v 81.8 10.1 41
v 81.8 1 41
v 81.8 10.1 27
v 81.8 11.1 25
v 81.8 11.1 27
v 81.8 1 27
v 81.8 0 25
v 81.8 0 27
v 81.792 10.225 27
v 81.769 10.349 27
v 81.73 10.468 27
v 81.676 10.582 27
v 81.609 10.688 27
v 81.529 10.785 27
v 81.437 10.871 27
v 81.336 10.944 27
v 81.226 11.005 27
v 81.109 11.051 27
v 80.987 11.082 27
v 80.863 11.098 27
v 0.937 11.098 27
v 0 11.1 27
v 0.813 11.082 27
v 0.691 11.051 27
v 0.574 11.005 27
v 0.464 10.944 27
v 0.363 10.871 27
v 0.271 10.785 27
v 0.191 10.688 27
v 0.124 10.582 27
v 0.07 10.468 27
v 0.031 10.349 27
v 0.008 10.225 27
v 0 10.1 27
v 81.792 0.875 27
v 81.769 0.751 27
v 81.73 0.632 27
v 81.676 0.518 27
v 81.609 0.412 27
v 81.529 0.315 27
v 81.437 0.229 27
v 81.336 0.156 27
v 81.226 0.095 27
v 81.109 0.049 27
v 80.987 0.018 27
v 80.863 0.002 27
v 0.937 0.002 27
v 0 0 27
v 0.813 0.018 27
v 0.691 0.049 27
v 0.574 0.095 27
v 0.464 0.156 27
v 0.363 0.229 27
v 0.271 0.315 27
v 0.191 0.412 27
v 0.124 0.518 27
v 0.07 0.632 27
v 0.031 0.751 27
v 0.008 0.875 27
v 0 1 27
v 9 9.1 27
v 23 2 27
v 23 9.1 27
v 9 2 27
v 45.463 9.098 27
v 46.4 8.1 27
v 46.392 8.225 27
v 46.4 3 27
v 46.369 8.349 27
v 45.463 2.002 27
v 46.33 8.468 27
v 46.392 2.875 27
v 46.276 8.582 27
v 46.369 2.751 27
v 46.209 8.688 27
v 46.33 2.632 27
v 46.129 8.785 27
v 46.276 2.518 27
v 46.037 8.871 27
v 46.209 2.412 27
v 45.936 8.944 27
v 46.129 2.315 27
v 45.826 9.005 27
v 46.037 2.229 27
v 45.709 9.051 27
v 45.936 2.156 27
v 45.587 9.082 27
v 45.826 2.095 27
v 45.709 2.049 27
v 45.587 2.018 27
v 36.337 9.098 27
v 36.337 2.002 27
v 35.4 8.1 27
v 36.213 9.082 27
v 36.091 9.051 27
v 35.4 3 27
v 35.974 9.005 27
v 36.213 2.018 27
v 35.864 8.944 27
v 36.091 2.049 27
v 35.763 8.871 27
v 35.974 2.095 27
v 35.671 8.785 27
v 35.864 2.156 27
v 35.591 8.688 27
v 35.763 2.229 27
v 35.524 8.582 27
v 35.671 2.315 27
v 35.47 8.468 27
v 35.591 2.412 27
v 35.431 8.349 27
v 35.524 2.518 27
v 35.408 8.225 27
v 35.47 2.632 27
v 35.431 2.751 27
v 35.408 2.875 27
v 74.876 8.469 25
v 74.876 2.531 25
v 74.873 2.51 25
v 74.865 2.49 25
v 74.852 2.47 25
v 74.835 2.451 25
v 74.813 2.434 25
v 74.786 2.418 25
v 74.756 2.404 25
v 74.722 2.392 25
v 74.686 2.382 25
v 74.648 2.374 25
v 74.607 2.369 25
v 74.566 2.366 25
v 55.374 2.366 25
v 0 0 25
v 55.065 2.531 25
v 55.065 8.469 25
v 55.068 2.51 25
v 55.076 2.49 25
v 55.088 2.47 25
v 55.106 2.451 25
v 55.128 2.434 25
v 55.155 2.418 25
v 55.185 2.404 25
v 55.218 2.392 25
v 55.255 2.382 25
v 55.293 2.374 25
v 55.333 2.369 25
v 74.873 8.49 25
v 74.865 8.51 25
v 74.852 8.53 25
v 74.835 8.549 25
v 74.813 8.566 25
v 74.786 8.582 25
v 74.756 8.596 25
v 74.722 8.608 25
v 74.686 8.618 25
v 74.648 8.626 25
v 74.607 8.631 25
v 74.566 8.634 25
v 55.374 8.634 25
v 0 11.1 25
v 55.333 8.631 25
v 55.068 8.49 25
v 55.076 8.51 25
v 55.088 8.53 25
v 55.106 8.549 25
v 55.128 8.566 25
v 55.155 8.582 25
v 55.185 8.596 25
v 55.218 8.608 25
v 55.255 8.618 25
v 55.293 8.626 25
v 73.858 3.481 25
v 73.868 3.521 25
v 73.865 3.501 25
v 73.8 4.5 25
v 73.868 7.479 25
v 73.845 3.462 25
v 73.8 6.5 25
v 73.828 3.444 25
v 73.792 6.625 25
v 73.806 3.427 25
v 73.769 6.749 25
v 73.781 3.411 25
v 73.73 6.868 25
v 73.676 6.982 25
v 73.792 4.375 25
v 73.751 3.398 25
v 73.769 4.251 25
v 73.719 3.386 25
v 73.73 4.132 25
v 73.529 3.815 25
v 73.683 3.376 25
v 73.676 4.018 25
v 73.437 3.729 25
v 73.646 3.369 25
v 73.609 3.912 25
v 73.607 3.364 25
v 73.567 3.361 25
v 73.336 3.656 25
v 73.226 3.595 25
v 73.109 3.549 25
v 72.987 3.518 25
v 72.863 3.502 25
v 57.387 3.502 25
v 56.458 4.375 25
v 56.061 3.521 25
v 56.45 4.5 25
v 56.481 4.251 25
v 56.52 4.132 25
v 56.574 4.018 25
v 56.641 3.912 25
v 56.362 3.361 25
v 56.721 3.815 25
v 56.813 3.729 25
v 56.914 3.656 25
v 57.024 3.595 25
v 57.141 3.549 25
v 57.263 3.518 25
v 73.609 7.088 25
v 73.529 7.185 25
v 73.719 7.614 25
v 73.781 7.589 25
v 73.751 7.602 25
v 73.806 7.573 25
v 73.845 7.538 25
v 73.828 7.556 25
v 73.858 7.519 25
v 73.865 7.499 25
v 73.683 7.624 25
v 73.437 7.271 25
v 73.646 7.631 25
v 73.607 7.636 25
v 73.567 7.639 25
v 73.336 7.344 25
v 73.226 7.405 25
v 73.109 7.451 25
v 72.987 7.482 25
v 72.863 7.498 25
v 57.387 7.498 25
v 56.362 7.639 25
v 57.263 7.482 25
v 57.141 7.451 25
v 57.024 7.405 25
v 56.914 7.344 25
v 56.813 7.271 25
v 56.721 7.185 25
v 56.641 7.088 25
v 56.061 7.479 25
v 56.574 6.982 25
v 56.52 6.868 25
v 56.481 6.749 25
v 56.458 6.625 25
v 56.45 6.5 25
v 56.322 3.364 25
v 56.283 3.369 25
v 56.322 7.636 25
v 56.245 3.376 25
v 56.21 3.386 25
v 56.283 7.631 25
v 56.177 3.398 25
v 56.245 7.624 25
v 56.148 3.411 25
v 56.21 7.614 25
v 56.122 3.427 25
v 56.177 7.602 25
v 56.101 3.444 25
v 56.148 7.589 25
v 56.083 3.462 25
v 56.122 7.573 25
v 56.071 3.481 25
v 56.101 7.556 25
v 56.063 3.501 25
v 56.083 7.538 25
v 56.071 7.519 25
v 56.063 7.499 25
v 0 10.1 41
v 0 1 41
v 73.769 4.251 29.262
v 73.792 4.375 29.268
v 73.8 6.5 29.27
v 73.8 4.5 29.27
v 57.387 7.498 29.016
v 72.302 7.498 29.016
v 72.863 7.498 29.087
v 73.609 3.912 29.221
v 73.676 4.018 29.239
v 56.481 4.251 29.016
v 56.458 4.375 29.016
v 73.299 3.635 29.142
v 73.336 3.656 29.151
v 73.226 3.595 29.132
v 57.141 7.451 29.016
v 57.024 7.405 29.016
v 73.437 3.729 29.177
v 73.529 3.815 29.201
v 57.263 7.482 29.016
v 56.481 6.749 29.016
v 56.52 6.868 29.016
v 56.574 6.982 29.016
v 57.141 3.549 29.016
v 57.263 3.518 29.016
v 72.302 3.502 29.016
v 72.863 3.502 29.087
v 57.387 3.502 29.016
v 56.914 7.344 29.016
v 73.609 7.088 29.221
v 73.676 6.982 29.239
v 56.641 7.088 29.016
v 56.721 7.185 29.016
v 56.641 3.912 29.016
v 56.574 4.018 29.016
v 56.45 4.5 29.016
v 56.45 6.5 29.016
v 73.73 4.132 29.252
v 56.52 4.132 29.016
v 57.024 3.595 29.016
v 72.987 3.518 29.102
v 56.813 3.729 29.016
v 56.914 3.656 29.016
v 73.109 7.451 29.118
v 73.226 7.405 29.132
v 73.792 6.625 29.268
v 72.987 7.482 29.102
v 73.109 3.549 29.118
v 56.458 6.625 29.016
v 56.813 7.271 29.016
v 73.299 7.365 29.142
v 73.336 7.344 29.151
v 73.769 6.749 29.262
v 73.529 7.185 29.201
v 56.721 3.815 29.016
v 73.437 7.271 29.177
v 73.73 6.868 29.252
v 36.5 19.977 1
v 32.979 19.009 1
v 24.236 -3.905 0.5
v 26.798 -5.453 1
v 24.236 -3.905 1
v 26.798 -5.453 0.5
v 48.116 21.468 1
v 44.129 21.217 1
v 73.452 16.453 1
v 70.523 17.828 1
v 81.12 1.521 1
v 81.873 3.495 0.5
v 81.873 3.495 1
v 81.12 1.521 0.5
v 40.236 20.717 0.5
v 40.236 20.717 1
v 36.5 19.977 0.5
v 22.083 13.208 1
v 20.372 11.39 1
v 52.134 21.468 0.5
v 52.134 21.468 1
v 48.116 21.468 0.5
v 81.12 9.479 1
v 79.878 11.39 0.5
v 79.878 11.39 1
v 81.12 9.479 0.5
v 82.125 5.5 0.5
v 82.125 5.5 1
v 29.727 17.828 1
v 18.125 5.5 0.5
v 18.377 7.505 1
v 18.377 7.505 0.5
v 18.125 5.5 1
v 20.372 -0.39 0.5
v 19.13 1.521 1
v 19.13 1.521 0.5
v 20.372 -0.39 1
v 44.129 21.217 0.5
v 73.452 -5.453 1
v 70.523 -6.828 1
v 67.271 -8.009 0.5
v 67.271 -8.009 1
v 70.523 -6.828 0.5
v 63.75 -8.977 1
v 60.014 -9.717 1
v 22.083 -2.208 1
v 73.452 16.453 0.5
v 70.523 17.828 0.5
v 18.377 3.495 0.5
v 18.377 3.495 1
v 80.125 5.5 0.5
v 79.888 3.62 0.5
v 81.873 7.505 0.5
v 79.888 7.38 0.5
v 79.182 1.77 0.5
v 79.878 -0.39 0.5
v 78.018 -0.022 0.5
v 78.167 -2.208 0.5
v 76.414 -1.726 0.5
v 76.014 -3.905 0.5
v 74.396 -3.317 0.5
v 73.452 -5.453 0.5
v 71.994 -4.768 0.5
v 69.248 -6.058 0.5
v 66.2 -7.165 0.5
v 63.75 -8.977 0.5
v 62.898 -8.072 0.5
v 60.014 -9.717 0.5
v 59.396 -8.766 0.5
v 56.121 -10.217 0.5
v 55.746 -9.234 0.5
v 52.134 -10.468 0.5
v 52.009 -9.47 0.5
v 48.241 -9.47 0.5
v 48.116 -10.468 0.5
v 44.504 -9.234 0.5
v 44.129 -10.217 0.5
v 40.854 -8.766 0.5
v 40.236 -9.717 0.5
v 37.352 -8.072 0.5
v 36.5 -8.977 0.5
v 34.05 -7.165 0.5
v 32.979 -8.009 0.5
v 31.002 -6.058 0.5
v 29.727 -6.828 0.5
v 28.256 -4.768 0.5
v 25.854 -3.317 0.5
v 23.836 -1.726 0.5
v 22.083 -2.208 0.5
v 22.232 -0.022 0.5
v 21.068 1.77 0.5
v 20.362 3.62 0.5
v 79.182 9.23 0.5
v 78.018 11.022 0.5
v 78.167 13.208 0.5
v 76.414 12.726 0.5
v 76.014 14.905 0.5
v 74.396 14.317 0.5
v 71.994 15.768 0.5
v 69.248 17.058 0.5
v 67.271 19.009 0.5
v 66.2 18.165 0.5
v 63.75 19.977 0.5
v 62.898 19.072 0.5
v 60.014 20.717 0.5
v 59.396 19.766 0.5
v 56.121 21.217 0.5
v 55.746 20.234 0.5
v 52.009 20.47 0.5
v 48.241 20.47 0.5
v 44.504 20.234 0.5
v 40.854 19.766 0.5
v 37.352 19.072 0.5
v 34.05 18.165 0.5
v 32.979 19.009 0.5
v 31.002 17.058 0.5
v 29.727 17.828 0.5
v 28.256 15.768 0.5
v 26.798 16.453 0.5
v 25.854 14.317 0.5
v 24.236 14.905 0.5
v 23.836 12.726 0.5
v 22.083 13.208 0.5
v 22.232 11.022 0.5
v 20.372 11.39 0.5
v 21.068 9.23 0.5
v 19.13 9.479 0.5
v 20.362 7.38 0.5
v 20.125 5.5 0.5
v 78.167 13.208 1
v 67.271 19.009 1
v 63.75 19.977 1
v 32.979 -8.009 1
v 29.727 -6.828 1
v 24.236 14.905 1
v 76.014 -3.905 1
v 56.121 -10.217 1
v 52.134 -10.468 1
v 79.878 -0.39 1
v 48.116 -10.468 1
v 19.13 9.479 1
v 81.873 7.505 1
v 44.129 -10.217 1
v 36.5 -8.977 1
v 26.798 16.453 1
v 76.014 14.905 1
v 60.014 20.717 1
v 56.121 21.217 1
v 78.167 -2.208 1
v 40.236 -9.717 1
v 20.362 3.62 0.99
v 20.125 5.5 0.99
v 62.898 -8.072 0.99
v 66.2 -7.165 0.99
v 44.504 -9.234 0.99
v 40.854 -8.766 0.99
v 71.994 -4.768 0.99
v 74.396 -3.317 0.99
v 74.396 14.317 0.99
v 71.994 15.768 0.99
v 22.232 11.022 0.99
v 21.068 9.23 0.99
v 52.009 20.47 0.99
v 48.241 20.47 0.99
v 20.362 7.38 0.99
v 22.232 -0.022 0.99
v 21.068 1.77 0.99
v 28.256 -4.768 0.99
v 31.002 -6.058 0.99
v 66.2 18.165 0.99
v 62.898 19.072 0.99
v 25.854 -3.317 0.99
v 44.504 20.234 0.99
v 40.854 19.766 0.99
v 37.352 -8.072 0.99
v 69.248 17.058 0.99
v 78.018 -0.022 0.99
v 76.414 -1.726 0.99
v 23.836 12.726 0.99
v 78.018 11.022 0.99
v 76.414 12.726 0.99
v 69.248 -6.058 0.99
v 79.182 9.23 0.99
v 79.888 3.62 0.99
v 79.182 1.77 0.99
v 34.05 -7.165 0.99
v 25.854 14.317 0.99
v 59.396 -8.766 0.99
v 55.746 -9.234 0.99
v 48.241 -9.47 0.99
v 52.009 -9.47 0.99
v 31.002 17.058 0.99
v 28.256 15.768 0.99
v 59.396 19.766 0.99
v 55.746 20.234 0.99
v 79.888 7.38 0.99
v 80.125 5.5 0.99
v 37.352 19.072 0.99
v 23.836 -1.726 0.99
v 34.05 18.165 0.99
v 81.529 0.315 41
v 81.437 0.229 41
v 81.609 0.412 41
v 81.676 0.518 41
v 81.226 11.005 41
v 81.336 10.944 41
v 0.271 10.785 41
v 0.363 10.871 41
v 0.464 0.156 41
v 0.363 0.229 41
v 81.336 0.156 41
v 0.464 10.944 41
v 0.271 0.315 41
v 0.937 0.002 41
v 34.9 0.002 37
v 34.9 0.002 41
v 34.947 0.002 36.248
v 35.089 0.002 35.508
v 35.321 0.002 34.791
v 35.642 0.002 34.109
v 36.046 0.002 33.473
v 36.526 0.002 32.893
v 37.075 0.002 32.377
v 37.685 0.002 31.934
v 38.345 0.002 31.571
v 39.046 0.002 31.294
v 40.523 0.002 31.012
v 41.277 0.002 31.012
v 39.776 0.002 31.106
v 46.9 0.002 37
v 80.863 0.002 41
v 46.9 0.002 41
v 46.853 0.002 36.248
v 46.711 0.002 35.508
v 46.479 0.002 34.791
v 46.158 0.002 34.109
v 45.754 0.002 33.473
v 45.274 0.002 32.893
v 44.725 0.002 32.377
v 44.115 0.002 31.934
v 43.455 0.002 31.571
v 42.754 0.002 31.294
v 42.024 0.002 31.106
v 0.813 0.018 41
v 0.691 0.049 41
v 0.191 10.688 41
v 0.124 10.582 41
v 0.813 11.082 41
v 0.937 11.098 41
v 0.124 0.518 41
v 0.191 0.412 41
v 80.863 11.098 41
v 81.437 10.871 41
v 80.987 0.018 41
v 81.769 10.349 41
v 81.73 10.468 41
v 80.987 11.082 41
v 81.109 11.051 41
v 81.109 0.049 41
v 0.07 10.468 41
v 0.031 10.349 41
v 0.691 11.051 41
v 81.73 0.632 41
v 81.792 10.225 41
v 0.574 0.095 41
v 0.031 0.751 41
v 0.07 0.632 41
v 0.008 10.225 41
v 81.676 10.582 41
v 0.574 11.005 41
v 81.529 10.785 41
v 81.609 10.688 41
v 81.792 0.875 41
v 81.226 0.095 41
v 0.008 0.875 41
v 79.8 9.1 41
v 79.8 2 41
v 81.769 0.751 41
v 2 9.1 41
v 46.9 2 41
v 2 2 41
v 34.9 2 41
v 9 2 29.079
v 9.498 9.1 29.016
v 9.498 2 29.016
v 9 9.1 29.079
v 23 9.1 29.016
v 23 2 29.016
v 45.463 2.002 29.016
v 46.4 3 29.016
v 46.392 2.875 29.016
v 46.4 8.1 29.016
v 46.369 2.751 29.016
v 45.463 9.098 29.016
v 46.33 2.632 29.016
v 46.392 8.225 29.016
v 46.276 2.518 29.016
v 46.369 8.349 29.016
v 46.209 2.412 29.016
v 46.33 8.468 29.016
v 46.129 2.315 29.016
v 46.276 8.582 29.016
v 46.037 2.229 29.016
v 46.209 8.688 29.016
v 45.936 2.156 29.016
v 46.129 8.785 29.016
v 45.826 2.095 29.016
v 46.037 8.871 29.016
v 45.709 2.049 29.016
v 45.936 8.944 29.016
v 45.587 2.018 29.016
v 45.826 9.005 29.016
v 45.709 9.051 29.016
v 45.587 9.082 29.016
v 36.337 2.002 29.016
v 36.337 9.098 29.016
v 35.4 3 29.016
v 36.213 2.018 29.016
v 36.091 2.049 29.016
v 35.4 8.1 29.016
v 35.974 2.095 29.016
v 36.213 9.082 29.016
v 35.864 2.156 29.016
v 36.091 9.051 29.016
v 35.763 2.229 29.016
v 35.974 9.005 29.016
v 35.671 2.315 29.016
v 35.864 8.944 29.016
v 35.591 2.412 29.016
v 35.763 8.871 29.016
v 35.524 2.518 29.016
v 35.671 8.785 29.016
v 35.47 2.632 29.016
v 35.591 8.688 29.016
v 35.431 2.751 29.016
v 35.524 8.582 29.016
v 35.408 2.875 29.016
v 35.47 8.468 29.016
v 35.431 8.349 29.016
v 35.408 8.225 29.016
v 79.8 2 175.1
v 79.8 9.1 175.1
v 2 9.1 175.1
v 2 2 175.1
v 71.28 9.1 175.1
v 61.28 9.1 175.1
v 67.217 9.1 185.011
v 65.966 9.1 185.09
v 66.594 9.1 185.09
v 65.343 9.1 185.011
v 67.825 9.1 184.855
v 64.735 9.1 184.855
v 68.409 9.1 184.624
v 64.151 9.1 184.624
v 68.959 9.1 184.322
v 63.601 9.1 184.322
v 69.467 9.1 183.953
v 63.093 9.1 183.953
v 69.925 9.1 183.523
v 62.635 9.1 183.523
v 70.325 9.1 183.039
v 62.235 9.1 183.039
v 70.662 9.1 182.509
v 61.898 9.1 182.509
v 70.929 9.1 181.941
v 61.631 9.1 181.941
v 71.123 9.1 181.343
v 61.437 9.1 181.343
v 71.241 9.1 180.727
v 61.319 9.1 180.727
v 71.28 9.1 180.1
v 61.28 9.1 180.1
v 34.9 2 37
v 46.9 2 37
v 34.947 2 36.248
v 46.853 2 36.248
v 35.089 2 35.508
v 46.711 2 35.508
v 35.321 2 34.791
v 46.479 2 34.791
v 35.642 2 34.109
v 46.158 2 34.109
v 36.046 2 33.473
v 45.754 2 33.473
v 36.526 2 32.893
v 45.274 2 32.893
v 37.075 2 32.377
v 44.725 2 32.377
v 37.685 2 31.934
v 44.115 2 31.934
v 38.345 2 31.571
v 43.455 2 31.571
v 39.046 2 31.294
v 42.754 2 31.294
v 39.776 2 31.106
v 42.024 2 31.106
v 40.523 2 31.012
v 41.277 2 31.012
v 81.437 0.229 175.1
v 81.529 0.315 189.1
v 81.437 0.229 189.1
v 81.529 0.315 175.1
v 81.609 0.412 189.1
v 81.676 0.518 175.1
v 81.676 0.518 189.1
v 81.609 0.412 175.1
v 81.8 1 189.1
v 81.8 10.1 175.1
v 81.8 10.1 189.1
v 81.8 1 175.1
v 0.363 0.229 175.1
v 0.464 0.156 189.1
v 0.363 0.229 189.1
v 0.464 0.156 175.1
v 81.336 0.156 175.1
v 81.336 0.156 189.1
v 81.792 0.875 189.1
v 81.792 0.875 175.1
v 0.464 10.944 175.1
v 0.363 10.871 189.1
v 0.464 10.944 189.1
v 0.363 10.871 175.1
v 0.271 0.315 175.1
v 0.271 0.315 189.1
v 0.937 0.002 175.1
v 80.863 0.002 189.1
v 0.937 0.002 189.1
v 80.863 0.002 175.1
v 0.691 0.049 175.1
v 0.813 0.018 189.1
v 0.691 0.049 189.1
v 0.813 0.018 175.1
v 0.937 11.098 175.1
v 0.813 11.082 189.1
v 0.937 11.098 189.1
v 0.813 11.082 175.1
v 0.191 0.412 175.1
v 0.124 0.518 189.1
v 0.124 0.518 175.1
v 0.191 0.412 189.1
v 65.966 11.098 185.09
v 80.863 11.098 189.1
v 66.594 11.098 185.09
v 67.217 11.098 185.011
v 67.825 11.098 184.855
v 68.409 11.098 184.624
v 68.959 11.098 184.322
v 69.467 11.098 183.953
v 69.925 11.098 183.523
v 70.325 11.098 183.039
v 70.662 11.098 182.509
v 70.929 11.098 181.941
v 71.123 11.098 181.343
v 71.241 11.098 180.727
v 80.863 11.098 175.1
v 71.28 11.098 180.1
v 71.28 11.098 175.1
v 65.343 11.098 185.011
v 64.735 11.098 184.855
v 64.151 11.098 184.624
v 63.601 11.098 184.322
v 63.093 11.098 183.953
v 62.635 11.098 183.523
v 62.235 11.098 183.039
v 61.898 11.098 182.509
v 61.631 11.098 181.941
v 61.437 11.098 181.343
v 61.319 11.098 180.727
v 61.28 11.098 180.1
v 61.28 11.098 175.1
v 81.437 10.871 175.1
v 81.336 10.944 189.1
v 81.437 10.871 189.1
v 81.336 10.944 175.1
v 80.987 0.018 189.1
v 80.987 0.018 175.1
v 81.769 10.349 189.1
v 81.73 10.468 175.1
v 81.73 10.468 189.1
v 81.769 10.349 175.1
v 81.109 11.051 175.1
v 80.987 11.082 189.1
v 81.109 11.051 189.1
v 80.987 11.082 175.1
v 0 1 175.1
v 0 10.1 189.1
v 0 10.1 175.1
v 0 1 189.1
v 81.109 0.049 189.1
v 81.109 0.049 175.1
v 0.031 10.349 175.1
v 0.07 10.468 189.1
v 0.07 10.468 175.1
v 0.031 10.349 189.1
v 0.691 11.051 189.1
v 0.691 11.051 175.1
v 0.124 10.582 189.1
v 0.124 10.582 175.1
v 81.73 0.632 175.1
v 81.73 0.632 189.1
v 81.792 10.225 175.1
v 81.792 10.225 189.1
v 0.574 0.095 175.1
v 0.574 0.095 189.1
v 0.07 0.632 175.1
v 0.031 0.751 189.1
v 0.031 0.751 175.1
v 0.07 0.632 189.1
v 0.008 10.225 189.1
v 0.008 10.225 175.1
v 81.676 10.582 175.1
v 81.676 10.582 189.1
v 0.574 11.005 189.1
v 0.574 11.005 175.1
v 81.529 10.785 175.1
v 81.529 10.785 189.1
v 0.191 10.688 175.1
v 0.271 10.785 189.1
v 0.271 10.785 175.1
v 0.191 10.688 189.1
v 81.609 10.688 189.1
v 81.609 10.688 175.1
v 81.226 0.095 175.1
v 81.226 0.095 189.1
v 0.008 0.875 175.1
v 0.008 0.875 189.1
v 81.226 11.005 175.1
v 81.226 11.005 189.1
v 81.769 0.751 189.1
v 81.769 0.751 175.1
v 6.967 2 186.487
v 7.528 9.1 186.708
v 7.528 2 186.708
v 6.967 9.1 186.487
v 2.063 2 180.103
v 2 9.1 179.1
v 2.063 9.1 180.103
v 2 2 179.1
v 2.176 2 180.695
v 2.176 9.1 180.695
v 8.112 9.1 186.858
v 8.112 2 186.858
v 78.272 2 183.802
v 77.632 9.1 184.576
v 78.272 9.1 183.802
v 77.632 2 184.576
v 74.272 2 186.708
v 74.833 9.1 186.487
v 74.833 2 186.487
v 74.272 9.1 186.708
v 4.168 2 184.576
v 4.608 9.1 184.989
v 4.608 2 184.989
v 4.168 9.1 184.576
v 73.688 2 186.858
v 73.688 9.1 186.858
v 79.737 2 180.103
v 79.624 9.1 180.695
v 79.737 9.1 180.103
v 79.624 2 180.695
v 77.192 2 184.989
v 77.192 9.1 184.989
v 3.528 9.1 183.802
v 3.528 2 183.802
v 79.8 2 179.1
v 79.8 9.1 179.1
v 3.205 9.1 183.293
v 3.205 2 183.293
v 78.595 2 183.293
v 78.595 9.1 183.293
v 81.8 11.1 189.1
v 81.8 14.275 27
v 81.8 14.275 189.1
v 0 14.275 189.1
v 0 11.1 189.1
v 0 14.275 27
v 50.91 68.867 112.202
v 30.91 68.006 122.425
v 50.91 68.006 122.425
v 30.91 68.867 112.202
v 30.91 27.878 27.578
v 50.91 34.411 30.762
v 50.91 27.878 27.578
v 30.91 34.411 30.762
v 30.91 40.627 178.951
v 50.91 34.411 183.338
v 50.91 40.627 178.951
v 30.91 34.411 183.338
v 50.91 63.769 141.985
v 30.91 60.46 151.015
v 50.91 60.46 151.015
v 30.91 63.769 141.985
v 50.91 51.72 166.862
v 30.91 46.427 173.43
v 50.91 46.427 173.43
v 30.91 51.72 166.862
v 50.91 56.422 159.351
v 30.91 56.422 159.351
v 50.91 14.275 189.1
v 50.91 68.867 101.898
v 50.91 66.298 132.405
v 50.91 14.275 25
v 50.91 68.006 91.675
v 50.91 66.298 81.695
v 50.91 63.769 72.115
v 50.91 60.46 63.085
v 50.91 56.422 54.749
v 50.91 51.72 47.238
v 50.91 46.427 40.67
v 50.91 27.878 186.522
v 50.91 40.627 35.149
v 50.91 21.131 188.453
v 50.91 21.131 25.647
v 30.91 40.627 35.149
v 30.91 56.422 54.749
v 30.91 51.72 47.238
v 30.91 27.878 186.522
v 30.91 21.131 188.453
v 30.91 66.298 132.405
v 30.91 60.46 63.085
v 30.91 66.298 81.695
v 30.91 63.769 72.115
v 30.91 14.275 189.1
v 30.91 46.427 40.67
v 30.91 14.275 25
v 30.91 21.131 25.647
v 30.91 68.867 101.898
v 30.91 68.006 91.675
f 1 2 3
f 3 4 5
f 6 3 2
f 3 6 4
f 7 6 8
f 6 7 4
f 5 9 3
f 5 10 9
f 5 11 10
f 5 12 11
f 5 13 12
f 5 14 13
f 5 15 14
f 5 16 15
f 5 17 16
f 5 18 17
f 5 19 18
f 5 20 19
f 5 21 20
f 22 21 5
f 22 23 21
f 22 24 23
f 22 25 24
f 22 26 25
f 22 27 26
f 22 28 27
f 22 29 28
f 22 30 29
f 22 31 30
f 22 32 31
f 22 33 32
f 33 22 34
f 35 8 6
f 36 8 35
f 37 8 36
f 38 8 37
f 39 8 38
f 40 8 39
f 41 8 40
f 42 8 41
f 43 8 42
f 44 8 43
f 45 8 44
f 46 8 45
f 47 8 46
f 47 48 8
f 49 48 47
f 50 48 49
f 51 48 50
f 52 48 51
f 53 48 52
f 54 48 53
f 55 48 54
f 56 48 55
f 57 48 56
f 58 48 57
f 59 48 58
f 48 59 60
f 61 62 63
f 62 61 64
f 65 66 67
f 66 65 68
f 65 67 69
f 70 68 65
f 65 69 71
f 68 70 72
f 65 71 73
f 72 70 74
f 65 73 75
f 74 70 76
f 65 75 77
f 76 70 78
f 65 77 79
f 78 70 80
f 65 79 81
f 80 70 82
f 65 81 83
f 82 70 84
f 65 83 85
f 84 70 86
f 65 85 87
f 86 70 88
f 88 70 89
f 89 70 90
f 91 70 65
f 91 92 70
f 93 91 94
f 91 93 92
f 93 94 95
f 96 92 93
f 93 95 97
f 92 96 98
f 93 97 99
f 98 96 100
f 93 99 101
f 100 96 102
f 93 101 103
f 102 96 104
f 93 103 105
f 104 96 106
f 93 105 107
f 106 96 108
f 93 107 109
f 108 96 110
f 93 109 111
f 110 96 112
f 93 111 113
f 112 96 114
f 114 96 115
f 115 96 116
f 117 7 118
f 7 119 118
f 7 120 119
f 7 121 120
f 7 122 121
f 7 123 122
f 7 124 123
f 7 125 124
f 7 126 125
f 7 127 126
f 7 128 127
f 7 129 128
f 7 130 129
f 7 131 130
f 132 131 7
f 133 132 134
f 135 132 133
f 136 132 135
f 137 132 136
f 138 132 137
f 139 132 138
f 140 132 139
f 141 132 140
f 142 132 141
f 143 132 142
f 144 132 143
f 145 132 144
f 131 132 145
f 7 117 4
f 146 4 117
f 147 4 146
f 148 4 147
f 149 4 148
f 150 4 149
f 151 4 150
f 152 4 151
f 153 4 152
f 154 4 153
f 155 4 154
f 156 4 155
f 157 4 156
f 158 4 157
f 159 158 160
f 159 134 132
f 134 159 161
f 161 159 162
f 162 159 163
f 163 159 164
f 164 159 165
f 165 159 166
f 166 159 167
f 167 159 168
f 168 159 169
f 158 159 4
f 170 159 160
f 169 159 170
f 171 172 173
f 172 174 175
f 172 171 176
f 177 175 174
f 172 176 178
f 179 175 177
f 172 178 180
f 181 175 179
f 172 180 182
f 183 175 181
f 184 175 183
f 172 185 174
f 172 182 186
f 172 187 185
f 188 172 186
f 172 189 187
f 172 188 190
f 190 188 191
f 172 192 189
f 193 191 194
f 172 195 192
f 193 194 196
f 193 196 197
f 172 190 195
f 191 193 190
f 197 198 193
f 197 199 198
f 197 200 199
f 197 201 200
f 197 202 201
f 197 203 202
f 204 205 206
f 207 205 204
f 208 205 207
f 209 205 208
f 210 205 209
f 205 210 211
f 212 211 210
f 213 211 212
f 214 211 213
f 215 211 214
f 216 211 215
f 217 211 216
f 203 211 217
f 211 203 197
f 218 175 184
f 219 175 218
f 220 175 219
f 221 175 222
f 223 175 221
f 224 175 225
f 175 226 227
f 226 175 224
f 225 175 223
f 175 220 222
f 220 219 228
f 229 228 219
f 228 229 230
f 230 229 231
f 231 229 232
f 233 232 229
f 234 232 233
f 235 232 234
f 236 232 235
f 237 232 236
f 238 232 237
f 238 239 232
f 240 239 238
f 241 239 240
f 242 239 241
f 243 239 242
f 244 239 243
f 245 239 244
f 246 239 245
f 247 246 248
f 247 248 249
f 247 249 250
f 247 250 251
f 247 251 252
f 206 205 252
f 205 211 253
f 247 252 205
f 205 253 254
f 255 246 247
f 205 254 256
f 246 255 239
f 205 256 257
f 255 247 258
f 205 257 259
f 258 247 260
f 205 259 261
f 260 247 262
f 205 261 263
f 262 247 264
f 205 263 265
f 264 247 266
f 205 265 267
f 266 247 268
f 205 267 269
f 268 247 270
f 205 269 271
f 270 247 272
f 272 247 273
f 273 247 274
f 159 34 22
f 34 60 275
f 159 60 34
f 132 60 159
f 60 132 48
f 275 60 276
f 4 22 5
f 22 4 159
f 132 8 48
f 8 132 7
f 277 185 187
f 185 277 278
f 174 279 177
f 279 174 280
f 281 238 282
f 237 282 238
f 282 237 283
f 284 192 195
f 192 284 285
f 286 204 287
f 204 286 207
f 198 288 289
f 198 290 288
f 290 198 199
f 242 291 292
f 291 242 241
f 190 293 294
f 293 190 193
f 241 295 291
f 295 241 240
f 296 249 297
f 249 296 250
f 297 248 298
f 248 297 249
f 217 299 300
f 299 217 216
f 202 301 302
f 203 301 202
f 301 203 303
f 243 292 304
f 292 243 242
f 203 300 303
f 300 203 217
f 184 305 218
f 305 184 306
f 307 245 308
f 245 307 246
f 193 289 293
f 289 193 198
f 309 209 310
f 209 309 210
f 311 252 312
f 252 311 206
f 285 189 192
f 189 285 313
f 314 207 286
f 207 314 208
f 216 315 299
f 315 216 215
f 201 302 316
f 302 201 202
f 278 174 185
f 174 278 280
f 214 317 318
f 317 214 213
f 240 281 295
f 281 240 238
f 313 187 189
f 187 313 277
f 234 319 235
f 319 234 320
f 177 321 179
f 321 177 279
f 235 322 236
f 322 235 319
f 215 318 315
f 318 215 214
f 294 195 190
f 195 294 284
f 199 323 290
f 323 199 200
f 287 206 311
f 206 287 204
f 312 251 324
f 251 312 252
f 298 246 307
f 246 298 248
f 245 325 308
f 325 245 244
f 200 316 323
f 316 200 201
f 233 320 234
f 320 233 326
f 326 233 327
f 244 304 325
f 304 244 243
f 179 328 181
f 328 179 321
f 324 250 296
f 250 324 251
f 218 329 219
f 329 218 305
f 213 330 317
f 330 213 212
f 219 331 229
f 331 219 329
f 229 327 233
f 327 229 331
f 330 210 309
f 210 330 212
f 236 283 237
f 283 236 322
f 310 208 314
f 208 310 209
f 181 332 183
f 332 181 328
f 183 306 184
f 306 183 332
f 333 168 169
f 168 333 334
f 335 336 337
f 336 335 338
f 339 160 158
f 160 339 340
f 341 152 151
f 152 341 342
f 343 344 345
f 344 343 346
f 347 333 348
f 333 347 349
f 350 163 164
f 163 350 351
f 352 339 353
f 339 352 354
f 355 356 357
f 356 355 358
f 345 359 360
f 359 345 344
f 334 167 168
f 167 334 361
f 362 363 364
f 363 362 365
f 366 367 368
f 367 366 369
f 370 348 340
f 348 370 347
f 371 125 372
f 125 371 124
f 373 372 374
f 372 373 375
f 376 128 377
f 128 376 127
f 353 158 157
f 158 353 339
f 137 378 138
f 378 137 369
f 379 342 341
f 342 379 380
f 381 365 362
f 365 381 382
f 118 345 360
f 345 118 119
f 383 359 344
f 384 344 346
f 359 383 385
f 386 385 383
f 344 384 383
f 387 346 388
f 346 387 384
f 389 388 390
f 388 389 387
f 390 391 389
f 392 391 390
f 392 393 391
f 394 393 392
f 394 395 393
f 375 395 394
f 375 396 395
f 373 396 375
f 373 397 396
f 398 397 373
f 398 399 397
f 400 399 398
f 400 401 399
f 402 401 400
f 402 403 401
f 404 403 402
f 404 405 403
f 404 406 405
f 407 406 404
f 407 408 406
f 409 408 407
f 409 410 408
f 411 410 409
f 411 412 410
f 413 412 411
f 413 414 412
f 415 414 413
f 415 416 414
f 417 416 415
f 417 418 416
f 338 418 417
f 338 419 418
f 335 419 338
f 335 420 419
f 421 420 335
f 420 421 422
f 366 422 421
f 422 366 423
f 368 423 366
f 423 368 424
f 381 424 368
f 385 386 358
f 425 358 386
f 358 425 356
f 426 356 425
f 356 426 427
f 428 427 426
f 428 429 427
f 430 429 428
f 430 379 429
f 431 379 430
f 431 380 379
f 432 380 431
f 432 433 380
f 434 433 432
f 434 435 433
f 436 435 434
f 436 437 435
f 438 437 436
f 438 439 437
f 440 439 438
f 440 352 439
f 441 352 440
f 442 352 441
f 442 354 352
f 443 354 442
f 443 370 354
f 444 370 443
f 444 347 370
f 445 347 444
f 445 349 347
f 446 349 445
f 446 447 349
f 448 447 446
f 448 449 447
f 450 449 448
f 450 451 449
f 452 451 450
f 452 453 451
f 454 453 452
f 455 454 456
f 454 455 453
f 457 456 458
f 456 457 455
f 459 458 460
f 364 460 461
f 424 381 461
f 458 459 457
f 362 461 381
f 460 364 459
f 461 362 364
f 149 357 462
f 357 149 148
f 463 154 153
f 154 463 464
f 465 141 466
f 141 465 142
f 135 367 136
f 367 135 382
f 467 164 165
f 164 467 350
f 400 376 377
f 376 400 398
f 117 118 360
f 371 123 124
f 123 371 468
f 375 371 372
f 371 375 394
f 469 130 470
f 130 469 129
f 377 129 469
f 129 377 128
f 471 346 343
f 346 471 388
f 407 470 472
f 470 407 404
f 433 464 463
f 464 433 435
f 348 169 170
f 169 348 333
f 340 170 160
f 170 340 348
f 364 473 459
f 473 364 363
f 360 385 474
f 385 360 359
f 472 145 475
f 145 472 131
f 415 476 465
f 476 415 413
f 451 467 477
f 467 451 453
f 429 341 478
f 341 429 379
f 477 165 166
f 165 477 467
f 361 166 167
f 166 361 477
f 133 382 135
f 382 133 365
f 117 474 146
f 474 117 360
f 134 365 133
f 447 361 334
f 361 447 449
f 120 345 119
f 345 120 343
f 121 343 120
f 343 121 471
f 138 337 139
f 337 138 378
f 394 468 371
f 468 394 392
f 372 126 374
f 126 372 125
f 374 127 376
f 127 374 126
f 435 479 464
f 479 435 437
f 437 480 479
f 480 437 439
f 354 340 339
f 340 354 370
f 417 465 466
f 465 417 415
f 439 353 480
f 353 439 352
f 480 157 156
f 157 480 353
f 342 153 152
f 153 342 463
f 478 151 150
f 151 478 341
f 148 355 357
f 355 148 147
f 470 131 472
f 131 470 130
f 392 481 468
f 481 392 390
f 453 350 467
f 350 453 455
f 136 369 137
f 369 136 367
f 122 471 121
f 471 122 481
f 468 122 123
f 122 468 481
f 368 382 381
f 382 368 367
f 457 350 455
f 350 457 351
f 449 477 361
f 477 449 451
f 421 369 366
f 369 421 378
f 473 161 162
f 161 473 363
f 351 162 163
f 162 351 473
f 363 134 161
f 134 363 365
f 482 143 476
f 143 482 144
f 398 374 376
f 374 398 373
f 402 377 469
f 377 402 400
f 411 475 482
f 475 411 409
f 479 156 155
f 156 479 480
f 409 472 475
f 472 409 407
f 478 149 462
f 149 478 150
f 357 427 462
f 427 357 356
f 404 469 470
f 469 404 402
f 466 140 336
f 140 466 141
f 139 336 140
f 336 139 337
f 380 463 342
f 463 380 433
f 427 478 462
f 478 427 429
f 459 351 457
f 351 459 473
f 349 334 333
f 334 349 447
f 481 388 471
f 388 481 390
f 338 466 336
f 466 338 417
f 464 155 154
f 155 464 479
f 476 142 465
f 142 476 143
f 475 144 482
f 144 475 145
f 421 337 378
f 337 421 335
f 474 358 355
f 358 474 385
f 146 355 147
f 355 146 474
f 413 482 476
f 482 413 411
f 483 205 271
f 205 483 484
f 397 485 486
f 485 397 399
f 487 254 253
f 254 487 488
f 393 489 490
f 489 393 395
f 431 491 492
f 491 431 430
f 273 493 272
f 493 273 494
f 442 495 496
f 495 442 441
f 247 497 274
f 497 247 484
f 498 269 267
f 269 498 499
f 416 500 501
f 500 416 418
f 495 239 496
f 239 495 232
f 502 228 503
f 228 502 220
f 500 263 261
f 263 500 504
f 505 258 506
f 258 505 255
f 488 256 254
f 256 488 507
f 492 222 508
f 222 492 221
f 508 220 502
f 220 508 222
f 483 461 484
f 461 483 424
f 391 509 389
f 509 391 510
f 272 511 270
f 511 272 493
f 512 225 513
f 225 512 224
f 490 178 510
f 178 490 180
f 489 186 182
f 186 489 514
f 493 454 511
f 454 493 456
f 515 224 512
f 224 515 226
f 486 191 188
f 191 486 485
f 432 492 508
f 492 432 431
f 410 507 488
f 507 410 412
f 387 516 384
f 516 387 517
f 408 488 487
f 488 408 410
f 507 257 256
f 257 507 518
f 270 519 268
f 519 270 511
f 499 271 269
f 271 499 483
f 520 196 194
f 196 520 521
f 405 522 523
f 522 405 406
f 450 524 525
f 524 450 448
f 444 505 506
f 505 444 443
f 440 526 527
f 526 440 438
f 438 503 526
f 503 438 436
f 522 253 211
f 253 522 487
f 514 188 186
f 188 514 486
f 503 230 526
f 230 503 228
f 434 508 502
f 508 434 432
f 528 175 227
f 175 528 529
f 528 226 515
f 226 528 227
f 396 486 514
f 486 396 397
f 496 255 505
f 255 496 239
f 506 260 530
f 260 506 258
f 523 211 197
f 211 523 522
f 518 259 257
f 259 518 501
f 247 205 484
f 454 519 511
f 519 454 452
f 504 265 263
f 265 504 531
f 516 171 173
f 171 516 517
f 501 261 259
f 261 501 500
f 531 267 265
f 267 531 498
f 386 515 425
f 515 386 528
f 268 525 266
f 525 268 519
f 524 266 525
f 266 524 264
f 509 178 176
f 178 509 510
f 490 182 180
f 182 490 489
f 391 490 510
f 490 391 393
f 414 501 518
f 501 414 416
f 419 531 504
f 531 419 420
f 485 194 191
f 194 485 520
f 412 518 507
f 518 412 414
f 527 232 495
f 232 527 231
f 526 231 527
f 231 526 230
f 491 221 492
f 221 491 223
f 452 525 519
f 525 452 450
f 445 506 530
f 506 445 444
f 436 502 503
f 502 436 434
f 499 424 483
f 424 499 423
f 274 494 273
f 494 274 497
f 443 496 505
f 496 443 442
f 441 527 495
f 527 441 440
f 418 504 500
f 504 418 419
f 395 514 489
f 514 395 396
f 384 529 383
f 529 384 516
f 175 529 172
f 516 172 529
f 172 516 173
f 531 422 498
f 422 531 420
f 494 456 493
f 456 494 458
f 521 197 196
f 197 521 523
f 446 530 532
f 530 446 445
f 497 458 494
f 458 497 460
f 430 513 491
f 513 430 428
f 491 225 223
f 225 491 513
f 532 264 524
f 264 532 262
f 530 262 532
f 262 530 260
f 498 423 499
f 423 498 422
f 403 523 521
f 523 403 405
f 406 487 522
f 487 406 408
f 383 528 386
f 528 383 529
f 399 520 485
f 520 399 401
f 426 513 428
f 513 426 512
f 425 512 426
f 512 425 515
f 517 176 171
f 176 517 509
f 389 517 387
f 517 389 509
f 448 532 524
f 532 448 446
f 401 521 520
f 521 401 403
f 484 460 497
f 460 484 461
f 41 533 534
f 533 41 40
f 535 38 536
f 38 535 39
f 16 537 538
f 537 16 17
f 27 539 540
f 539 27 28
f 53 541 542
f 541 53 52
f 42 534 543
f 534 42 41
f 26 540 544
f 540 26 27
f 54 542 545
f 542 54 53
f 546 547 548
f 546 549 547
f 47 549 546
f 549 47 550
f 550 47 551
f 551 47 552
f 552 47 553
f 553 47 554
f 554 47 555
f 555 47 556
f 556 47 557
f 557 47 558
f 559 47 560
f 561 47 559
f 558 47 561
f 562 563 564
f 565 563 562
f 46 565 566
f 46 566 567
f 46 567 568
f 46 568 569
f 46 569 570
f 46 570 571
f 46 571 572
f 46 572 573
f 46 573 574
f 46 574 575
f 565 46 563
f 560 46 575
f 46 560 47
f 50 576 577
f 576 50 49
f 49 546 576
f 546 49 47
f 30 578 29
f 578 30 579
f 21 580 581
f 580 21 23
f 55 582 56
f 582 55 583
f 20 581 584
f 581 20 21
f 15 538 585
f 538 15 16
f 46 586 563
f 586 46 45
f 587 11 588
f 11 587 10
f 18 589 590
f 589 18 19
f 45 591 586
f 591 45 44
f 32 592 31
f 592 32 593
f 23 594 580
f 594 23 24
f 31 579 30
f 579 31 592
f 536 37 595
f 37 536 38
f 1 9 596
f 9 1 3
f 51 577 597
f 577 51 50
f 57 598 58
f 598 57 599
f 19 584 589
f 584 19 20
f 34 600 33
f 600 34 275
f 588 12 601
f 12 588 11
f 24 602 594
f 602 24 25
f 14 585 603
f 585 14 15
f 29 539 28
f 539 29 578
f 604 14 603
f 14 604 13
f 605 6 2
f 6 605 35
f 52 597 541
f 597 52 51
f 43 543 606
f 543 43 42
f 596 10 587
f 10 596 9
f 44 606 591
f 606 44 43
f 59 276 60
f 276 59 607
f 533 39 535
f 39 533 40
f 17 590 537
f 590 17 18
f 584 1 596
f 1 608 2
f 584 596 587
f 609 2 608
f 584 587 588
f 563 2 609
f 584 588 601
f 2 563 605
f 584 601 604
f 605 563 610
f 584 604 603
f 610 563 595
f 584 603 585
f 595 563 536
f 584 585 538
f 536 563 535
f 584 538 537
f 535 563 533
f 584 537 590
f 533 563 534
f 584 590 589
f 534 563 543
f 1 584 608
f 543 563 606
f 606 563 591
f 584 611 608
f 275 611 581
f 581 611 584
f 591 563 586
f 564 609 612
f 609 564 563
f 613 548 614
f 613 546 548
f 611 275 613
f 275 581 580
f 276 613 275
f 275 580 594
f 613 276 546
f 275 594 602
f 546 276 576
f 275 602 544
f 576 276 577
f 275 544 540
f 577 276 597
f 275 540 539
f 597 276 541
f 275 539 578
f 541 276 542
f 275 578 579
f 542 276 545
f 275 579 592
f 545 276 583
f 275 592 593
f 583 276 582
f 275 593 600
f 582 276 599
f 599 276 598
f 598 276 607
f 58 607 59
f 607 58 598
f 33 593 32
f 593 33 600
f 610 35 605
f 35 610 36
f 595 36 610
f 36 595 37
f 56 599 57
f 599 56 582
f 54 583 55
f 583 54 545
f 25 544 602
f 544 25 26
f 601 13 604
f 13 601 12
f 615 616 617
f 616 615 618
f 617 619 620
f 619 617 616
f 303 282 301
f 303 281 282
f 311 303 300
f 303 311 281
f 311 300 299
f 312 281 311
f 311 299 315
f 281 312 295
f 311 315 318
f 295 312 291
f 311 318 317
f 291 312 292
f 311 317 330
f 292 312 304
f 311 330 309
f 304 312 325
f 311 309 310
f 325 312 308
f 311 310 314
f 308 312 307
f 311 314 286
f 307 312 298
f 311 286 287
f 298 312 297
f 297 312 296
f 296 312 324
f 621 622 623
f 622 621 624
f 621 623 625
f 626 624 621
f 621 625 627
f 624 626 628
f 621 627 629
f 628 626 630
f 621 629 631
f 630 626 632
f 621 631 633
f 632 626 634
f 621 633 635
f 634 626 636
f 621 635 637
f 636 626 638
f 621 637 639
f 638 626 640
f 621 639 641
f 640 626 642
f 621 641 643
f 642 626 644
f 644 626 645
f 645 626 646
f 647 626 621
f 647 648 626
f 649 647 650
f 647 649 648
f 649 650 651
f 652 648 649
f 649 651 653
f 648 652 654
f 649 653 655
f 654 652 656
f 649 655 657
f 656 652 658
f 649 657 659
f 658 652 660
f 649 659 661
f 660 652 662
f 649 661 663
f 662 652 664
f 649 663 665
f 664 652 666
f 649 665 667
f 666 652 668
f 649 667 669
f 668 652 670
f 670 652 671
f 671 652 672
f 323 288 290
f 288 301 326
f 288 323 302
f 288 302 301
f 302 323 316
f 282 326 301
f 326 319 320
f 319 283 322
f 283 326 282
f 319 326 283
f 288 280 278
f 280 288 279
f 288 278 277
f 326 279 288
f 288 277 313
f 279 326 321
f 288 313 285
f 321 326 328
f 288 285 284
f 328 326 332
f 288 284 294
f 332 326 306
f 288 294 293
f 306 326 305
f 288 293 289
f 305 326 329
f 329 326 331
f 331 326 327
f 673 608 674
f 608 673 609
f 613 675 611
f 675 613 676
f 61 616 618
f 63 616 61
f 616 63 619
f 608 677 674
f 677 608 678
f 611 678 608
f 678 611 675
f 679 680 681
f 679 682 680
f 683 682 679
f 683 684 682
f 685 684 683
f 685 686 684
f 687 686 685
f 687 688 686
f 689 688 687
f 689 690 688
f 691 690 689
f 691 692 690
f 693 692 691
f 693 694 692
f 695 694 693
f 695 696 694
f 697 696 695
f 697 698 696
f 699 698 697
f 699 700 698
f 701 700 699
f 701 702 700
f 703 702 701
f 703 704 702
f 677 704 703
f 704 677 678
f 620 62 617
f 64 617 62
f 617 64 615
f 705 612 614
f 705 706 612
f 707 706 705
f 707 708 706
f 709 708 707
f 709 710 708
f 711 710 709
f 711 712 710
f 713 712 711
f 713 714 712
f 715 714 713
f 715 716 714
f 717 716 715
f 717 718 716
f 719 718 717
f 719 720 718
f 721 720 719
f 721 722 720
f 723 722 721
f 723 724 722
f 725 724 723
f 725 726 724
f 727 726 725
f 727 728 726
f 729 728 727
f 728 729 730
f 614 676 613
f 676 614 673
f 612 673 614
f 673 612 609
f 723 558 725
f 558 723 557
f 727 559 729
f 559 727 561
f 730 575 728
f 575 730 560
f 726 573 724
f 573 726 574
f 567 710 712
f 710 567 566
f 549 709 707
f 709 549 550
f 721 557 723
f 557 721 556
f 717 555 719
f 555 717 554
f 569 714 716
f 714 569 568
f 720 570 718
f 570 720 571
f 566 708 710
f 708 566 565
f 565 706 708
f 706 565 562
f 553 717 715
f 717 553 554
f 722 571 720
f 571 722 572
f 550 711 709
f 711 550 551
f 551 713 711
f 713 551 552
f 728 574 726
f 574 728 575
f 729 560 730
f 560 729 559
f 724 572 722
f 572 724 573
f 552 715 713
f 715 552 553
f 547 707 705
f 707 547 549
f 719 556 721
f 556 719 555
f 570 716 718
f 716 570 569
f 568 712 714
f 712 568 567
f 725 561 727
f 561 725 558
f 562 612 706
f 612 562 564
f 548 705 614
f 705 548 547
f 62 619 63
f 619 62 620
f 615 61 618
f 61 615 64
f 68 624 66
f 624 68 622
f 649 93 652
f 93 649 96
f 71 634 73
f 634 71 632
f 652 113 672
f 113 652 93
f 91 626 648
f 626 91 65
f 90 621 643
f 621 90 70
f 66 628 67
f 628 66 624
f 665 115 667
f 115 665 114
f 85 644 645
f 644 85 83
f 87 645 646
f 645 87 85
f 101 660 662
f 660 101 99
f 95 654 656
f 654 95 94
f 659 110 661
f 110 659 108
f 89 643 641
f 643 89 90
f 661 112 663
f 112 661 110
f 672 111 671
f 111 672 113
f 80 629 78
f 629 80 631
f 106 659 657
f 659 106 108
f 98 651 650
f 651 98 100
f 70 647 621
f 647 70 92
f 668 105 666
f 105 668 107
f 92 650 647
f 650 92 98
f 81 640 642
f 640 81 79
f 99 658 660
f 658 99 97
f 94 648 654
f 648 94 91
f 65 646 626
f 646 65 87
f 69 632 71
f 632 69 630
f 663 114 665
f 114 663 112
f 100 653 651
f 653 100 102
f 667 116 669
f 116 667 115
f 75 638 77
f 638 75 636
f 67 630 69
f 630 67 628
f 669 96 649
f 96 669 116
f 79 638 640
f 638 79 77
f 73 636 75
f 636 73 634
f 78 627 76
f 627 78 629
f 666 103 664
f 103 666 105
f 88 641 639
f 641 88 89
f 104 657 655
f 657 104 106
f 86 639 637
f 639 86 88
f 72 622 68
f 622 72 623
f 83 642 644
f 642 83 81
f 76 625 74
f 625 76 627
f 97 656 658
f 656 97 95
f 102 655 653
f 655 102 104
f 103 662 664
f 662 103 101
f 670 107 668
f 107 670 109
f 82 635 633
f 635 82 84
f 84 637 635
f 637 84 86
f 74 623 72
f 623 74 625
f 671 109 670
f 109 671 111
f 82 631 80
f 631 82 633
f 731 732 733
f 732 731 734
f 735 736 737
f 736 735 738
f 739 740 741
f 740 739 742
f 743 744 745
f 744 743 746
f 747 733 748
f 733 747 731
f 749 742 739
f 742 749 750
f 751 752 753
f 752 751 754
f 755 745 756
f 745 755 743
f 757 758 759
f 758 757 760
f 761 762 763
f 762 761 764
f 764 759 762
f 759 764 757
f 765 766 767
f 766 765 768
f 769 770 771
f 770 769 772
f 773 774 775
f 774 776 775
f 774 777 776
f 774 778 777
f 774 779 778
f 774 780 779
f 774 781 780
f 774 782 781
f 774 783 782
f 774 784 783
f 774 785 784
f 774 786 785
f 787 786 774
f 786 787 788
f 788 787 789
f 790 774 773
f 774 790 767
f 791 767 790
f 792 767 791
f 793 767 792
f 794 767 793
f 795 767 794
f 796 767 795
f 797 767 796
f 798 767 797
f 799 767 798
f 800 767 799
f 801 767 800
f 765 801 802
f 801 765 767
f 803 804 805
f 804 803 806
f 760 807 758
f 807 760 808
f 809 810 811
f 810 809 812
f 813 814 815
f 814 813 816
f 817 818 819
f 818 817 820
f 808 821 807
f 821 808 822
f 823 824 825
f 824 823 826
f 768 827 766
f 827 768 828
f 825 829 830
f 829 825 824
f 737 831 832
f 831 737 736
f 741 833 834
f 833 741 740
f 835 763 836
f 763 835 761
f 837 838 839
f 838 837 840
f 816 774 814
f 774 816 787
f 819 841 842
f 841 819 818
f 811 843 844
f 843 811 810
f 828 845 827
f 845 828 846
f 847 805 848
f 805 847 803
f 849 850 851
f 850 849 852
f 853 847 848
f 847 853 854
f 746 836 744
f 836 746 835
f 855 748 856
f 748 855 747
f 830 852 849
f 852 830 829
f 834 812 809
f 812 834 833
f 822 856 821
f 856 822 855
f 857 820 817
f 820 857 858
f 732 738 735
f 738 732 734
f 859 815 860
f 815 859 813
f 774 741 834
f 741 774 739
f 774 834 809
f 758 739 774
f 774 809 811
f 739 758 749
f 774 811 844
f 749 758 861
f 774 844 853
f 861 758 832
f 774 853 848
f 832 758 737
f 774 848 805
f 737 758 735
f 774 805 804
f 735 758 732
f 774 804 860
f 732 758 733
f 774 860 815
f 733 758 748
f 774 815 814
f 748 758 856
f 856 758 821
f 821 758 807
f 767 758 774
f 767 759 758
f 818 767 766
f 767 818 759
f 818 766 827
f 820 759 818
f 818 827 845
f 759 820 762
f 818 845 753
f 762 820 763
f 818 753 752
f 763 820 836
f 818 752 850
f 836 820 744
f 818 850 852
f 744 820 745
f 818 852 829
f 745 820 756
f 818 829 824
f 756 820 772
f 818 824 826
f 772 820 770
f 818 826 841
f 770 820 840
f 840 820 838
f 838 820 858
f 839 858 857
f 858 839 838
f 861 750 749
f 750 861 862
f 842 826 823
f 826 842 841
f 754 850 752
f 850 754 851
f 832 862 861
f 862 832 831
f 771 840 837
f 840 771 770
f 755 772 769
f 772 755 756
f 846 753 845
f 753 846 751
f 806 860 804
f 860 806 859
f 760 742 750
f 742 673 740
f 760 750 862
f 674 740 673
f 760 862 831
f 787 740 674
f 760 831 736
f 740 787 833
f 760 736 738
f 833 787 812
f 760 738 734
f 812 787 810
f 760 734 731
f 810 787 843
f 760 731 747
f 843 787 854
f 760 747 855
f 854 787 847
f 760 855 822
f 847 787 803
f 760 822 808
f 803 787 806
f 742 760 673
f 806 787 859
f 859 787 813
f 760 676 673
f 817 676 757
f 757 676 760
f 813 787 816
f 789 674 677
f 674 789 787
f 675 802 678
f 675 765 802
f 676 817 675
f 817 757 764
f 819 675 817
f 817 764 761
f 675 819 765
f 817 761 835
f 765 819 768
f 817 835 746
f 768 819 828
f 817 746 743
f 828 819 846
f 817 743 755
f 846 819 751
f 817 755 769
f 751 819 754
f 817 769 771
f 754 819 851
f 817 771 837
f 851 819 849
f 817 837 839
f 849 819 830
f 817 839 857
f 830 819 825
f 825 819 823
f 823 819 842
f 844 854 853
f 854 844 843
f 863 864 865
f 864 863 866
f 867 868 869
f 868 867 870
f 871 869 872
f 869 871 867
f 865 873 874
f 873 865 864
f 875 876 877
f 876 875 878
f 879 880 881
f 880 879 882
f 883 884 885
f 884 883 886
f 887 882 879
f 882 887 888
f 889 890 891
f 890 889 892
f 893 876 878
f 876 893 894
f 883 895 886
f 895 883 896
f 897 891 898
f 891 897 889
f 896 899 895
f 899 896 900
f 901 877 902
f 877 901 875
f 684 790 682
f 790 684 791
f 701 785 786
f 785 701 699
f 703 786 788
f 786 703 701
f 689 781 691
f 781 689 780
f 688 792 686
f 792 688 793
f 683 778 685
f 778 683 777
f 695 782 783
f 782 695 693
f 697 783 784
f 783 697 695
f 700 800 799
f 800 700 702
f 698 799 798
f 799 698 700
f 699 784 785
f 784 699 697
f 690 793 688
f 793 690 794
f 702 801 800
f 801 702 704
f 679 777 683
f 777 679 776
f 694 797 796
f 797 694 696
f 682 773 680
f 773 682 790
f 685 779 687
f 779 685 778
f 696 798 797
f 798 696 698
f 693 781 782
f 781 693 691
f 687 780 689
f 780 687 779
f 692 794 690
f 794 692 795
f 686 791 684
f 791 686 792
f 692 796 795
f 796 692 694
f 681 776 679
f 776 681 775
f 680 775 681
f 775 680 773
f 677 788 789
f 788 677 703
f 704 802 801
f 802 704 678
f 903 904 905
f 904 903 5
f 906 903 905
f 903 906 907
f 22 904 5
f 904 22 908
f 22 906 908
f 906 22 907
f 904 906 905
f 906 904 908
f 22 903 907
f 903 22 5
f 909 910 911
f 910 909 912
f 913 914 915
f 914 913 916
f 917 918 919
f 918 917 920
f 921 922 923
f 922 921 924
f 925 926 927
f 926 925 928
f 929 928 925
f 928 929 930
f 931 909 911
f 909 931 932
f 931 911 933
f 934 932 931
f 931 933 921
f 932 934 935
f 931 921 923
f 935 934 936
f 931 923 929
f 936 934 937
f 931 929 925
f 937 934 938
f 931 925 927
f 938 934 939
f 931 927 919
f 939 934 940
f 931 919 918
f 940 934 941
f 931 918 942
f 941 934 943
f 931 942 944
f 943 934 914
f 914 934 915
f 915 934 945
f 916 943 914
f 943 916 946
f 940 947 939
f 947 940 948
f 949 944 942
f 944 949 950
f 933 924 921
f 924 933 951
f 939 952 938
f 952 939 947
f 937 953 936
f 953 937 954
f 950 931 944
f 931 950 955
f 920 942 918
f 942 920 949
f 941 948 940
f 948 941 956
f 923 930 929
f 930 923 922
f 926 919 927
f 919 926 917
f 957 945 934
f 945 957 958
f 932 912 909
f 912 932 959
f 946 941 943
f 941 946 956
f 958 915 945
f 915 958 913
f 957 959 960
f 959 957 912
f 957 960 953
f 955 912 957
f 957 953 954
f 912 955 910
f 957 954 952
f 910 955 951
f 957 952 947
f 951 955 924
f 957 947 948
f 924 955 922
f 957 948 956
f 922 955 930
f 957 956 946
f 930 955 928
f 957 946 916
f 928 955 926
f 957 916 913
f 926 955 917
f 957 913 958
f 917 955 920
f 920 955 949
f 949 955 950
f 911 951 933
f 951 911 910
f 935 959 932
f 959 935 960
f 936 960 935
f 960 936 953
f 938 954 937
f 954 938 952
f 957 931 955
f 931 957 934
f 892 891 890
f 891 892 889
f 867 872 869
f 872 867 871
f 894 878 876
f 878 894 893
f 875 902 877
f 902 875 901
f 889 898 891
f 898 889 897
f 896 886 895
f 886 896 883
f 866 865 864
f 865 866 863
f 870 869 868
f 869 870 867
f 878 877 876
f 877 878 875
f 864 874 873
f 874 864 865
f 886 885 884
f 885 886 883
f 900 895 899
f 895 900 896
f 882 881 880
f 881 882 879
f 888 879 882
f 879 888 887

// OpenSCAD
// file: ../lib/basics.scad
// ## `basics.scad`
// This library contains basic elements to construct mobile device augmentations.

// ### `roundedCube(dimension,edgeRadius)`
// A cube with rounded edges on the depth axis. This function is helpful for creating simple phone shapes.
// #### Where
// * `dimension=[width,depth,height]`: the size of the cube
// * `edgeRadius`: the radius of the rounded edges 
module roundedCube(dimension=[10,10,10],edgeRadius=1){
    translate([0,dimension[1],0])
		rotate([90,0,0])
			hull(){
        		translate([edgeRadius,edgeRadius,0])
					cylinder(r=edgeRadius,h=dimension[1]);
        		translate([dimension[0]-edgeRadius,edgeRadius,0])
					cylinder(r=edgeRadius,h=dimension[1]);
        		translate([edgeRadius,dimension[2]-edgeRadius,0])
					cylinder(r=edgeRadius,h=dimension[1]);
        		translate([dimension[0]-edgeRadius,dimension[2]-edgeRadius,0])
					cylinder(r=edgeRadius,h=dimension[1]);
    		}
}

// ### `bottomHolder(deviceWidth,deviceDepth,deviceEdgeRadius,deviceHeightInHolder,wallThickness,holderEdgeRadius)`
// A basic generic element to hold the bottom part of a device
// #### Where
// * `deviceWidth`: the width of the device to be held
// * `deviceDepth`: the depth of the device to be held
// * `deviceEdgeRadius`: the edge radius of the device to be held
// * `deviceHeightInHolder`: the height of the part of the holder covering the device
// * `wallThickness`: the holder's wall thickness
// * `holderEdgeRadius`: the holder's edge radius
module bottomHolder(deviceWidth=10,deviceDepth=10,deviceEdgeRadius=1,
deviceHeightInHolder=10,wallThickness=1,holderEdgeRadius=1){
	difference(){
		translate([0,deviceDepth+wallThickness*2,0])
			rotate([90,0,0])
				roundedCube([deviceWidth+wallThickness*2,deviceHeightInHolder+wallThickness,
				deviceDepth+wallThickness*2],holderEdgeRadius);
		translate([wallThickness,wallThickness,wallThickness])
			roundedCube([deviceWidth,deviceDepth,
			deviceHeightInHolder+deviceEdgeRadius],deviceEdgeRadius);
	}
}

// ### `topHolder(deviceWidth,deviceDepth,deviceEdgeRadius,deviceHeightInHolder,wallThickness,lipsWidth,holderEdgeRadius)`
// A basic generic element to hold the top part of a device
// #### Where
// * `deviceWidth`: the width of the device to be held
// * `deviceDepth`: the depth of the device to be held
// * `deviceEdgeRadius`: the edge radius of the device to be held
// * `deviceHeightInHolder`: the height of the part of the holder covering the device
// * `wallThickness`: the holder's wall thickness
// * `lipsWidth`: size of the lips holding the device
// * `holderEdgeRadius`: the holder's edge radius
module topHolder(deviceWidth=10,deviceDepth=10,deviceEdgeRadius=1,deviceHeightInHolder=10,
wallThickness=1,lipsWidth=2,holderEdgeRadius=1){
	difference(){
		translate([0,deviceDepth+wallThickness*2,0])rotate([90,0,0])
			roundedCube([deviceWidth+wallThickness*2,deviceHeightInHolder+wallThickness,
			deviceDepth+wallThickness*2],holderEdgeRadius);
		translate([wallThickness,wallThickness,-wallThickness*2])
			roundedCube([deviceWidth,deviceDepth,deviceHeightInHolder],deviceEdgeRadius);
		//translate([wallThickness+lipsWidth,-0.01,-wallThickness-lipsWidth-0.85]) // TODO: 0.85 wrong here: needs to be fixed
		//	roundedCube([deviceWidth-lipsWidth*2,wallThickness+0.02,deviceHeightInHolder],
	//		deviceEdgeRadius*((deviceWidth-lipsWidth*2)/deviceWidth));
	}
}

// ### `rectangleCircularHorn(rectangleWidth,rectangleHeight,circleRadius,hornLength,wallThickness,hornDeformationFactor,hornDerivation,endsHeight)`
// A horn with a square termination on one side and a circle termination on the other.
// #### Where
// * `rectangleWidth`: the width of the rectangular termination
// * `rectangleHeight`: the height of the rectangular termination
// * `circleRadius`: the radius of the circular termination
// * `hornLength`: the length of the horn
// * `wallThickness`: the thickness of the walls
// * `hornDeformationFactor`: controls the vertical flatness of the horn with (1=perfect circle, >1=flatened circle) 
// * `hornDerivation`: displace the position of the circular end relatively to the rectangular end on the horizontal axis
// * `endsHeight`: the height of the two ends
module rectangleCircularHorn(rectangleWidth=10,rectangleHeight=10,circleRadius=10,hornLength=10,wallThickness=1,
hornDeformationFactor=1,hornDerivation=0,endsHeight=0.5){
	difference(){
		hull(){
			cube([rectangleWidth+wallThickness,rectangleHeight+wallThickness,endsHeight],center=true);
			translate([hornDerivation,0,hornLength-endsHeight*2])
				scale([1,hornDeformationFactor,1])
					cylinder(r=circleRadius+wallThickness,h=endsHeight);
		}
		hull(){
			translate([0,0,-0.01])
				cube([rectangleWidth,rectangleHeight,endsHeight],center=true);
			translate([hornDerivation,0,hornLength-endsHeight*2+0.01])
				scale([1,hornDeformationFactor,1])
					cylinder(r=circleRadius,h=endsHeight);
		}
	}
}

// ### `halfSphere(radius)`
// A half sphere useful to create tops.
// #### Where
// * `radius`: the radius of the half sphere
module halfSphere(radius=10){
	difference(){
		translate([radius,radius,0])sphere(radius);
		translate([0,0,-radius*2])cube([radius*2,radius*2,radius*2]);
	}
}

// ### `halfCylinder(dimension=[10,10,10])`
// A half cylinder with controllable height.
// #### Where
// * `dimension=[width,depth,height]`: the size of the half cylinder
module halfCylinder(dimension=[10,10,10]){
	rotate([-90,0,0])scale([1,dimension[2]/dimension[0],1])difference(){
		translate([dimension[0]/2,0,0.01])cylinder(r=dimension[0]/2,h=dimension[1]);
		cube([dimension[0],dimension[0],dimension[1]+0.02]);
	}
}
// main file
include <../lib/iPhone6Plus.scad>

$fn=50;

iPhone6Plus_CaseRock();
translate([iPhone6Plus_Module_WallThickness,iPhone6Plus_Module_WallThickness,iPhone6Plus_Module_WallThickness+iPhone6Plus_SmallPassiveAmp_HornLength+iPhone6Plus_SmallPassiveAmp_BaseThickness])iPhone6Plus();
